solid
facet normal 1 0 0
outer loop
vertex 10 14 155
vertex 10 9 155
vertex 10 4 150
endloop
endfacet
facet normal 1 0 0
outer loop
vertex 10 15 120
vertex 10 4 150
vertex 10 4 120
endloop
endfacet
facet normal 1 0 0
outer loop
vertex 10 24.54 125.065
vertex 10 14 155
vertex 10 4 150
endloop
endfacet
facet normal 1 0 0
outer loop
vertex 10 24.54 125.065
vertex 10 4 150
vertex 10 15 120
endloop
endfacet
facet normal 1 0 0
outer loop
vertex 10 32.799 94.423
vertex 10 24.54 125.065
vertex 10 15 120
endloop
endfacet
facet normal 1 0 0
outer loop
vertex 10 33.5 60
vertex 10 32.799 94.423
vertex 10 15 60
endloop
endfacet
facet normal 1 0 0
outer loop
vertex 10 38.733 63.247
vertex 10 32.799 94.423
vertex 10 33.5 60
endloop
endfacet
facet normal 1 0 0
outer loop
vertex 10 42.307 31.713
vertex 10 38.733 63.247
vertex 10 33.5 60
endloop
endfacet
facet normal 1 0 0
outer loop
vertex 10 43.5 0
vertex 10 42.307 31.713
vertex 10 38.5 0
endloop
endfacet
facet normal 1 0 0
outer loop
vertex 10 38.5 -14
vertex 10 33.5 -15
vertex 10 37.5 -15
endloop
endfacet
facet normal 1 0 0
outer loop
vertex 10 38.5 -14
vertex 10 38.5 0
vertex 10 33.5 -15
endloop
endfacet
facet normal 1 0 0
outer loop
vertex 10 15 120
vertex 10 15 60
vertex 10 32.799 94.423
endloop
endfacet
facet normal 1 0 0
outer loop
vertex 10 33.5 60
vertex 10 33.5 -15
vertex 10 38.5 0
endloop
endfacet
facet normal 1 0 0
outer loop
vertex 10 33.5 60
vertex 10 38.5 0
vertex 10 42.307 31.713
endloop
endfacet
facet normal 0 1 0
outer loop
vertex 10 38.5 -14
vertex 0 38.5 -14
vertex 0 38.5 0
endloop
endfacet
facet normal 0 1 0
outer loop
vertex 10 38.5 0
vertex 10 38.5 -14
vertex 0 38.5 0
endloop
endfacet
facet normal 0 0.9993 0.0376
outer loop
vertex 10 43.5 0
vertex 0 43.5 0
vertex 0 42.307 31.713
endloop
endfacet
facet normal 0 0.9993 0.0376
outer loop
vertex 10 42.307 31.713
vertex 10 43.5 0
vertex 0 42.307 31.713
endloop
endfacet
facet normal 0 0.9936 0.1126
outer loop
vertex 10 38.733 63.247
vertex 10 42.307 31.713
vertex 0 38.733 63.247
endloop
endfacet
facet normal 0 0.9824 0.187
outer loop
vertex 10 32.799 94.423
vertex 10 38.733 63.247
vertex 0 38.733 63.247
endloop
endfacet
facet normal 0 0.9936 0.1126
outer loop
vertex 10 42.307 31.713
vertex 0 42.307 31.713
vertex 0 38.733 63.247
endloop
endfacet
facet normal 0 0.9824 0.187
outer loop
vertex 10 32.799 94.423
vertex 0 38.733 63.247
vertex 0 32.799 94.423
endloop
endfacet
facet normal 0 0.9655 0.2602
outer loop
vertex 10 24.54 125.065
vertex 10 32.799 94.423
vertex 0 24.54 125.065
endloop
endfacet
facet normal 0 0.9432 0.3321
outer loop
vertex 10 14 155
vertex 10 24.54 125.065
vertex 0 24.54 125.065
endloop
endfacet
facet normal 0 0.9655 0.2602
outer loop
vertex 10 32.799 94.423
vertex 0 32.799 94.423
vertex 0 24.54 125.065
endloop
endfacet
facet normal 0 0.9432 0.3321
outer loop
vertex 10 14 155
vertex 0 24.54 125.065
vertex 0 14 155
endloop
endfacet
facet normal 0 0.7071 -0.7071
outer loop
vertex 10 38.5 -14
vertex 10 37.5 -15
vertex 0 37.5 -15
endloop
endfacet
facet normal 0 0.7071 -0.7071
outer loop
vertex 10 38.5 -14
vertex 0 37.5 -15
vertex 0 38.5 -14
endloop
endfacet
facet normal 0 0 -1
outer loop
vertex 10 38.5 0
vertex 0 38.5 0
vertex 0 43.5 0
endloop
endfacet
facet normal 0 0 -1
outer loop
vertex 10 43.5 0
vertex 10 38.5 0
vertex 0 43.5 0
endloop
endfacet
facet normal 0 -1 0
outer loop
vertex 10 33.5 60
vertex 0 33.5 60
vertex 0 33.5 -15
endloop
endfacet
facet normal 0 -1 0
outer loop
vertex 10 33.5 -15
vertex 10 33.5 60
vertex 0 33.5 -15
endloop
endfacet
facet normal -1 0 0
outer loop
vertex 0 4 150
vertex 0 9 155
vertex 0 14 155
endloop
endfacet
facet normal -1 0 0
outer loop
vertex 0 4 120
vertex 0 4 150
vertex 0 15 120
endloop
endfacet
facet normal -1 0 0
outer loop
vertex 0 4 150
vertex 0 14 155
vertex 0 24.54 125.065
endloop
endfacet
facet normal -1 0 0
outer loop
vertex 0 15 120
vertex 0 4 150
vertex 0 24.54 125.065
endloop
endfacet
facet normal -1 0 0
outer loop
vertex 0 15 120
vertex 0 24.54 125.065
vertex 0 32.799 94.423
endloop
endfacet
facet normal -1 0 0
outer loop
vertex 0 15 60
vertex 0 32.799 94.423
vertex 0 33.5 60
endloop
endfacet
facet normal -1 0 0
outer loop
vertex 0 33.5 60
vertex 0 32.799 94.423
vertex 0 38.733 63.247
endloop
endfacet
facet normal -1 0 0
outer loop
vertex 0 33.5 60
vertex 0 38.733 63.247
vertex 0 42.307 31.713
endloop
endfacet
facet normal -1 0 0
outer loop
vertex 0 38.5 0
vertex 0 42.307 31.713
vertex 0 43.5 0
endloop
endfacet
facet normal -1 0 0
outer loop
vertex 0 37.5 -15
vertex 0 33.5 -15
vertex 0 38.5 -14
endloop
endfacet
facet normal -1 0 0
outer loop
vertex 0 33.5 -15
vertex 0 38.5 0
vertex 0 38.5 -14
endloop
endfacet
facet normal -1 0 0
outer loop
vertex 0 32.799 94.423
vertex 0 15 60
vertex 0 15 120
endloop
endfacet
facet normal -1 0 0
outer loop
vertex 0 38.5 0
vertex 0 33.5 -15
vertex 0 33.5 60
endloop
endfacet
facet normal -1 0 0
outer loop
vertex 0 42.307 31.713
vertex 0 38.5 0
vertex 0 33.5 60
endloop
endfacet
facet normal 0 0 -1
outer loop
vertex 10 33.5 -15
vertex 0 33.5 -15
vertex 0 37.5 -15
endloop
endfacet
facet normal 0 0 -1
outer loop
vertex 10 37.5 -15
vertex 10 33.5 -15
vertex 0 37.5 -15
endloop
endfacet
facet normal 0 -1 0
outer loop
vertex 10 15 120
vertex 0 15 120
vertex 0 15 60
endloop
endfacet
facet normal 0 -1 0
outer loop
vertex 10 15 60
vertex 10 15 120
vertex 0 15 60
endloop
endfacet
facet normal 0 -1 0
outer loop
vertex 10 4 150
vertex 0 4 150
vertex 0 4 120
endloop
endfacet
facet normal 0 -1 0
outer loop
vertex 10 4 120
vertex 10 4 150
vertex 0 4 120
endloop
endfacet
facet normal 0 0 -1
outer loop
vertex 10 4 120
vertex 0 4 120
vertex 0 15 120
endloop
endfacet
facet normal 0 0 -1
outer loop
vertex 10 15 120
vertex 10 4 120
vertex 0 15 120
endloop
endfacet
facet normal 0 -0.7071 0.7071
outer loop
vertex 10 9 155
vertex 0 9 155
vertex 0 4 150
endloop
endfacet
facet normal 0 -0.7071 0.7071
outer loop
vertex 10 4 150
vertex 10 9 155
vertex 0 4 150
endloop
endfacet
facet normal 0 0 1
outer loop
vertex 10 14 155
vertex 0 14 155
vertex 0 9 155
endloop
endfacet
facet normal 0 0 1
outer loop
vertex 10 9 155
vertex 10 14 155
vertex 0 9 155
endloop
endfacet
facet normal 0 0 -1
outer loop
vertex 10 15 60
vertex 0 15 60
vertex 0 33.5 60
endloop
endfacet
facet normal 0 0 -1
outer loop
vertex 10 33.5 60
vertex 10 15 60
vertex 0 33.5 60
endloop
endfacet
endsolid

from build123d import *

# Parameters (mm, degrees)
EXTRUDE1_DEPTH = 10


with BuildPart() as part:
    # Sketch1<2> → Extrude1 (new body)
    with BuildSketch(Plane(origin=(0, 0, 0), x_dir=(0, 0, -1), z_dir=(1, 0, 0))):
        with BuildLine():
            Line((-155, 14), (-155, 9))
            Line((-155, 9), (-150, 4))
            Line((-150, 4), (-120, 4))
            Line((-120, 4), (-120, 15))
            Line((-120, 15), (-60, 15))
            Line((-60, 15), (-60, 33.5))
            Line((-60, 33.5), (15, 33.5))
            Line((15, 33.5), (15, 37.5))
            Line((15, 37.5), (14, 38.5))
            Line((14, 38.5), (0, 38.5))
            Line((0, 38.5), (0, 43.5))
            ThreePointArc((0, 43.5), (-78.891143356, 36.059397294), (-155, 14))
        make_face()
    extrude(amount=EXTRUDE1_DEPTH)


solid = part.part
